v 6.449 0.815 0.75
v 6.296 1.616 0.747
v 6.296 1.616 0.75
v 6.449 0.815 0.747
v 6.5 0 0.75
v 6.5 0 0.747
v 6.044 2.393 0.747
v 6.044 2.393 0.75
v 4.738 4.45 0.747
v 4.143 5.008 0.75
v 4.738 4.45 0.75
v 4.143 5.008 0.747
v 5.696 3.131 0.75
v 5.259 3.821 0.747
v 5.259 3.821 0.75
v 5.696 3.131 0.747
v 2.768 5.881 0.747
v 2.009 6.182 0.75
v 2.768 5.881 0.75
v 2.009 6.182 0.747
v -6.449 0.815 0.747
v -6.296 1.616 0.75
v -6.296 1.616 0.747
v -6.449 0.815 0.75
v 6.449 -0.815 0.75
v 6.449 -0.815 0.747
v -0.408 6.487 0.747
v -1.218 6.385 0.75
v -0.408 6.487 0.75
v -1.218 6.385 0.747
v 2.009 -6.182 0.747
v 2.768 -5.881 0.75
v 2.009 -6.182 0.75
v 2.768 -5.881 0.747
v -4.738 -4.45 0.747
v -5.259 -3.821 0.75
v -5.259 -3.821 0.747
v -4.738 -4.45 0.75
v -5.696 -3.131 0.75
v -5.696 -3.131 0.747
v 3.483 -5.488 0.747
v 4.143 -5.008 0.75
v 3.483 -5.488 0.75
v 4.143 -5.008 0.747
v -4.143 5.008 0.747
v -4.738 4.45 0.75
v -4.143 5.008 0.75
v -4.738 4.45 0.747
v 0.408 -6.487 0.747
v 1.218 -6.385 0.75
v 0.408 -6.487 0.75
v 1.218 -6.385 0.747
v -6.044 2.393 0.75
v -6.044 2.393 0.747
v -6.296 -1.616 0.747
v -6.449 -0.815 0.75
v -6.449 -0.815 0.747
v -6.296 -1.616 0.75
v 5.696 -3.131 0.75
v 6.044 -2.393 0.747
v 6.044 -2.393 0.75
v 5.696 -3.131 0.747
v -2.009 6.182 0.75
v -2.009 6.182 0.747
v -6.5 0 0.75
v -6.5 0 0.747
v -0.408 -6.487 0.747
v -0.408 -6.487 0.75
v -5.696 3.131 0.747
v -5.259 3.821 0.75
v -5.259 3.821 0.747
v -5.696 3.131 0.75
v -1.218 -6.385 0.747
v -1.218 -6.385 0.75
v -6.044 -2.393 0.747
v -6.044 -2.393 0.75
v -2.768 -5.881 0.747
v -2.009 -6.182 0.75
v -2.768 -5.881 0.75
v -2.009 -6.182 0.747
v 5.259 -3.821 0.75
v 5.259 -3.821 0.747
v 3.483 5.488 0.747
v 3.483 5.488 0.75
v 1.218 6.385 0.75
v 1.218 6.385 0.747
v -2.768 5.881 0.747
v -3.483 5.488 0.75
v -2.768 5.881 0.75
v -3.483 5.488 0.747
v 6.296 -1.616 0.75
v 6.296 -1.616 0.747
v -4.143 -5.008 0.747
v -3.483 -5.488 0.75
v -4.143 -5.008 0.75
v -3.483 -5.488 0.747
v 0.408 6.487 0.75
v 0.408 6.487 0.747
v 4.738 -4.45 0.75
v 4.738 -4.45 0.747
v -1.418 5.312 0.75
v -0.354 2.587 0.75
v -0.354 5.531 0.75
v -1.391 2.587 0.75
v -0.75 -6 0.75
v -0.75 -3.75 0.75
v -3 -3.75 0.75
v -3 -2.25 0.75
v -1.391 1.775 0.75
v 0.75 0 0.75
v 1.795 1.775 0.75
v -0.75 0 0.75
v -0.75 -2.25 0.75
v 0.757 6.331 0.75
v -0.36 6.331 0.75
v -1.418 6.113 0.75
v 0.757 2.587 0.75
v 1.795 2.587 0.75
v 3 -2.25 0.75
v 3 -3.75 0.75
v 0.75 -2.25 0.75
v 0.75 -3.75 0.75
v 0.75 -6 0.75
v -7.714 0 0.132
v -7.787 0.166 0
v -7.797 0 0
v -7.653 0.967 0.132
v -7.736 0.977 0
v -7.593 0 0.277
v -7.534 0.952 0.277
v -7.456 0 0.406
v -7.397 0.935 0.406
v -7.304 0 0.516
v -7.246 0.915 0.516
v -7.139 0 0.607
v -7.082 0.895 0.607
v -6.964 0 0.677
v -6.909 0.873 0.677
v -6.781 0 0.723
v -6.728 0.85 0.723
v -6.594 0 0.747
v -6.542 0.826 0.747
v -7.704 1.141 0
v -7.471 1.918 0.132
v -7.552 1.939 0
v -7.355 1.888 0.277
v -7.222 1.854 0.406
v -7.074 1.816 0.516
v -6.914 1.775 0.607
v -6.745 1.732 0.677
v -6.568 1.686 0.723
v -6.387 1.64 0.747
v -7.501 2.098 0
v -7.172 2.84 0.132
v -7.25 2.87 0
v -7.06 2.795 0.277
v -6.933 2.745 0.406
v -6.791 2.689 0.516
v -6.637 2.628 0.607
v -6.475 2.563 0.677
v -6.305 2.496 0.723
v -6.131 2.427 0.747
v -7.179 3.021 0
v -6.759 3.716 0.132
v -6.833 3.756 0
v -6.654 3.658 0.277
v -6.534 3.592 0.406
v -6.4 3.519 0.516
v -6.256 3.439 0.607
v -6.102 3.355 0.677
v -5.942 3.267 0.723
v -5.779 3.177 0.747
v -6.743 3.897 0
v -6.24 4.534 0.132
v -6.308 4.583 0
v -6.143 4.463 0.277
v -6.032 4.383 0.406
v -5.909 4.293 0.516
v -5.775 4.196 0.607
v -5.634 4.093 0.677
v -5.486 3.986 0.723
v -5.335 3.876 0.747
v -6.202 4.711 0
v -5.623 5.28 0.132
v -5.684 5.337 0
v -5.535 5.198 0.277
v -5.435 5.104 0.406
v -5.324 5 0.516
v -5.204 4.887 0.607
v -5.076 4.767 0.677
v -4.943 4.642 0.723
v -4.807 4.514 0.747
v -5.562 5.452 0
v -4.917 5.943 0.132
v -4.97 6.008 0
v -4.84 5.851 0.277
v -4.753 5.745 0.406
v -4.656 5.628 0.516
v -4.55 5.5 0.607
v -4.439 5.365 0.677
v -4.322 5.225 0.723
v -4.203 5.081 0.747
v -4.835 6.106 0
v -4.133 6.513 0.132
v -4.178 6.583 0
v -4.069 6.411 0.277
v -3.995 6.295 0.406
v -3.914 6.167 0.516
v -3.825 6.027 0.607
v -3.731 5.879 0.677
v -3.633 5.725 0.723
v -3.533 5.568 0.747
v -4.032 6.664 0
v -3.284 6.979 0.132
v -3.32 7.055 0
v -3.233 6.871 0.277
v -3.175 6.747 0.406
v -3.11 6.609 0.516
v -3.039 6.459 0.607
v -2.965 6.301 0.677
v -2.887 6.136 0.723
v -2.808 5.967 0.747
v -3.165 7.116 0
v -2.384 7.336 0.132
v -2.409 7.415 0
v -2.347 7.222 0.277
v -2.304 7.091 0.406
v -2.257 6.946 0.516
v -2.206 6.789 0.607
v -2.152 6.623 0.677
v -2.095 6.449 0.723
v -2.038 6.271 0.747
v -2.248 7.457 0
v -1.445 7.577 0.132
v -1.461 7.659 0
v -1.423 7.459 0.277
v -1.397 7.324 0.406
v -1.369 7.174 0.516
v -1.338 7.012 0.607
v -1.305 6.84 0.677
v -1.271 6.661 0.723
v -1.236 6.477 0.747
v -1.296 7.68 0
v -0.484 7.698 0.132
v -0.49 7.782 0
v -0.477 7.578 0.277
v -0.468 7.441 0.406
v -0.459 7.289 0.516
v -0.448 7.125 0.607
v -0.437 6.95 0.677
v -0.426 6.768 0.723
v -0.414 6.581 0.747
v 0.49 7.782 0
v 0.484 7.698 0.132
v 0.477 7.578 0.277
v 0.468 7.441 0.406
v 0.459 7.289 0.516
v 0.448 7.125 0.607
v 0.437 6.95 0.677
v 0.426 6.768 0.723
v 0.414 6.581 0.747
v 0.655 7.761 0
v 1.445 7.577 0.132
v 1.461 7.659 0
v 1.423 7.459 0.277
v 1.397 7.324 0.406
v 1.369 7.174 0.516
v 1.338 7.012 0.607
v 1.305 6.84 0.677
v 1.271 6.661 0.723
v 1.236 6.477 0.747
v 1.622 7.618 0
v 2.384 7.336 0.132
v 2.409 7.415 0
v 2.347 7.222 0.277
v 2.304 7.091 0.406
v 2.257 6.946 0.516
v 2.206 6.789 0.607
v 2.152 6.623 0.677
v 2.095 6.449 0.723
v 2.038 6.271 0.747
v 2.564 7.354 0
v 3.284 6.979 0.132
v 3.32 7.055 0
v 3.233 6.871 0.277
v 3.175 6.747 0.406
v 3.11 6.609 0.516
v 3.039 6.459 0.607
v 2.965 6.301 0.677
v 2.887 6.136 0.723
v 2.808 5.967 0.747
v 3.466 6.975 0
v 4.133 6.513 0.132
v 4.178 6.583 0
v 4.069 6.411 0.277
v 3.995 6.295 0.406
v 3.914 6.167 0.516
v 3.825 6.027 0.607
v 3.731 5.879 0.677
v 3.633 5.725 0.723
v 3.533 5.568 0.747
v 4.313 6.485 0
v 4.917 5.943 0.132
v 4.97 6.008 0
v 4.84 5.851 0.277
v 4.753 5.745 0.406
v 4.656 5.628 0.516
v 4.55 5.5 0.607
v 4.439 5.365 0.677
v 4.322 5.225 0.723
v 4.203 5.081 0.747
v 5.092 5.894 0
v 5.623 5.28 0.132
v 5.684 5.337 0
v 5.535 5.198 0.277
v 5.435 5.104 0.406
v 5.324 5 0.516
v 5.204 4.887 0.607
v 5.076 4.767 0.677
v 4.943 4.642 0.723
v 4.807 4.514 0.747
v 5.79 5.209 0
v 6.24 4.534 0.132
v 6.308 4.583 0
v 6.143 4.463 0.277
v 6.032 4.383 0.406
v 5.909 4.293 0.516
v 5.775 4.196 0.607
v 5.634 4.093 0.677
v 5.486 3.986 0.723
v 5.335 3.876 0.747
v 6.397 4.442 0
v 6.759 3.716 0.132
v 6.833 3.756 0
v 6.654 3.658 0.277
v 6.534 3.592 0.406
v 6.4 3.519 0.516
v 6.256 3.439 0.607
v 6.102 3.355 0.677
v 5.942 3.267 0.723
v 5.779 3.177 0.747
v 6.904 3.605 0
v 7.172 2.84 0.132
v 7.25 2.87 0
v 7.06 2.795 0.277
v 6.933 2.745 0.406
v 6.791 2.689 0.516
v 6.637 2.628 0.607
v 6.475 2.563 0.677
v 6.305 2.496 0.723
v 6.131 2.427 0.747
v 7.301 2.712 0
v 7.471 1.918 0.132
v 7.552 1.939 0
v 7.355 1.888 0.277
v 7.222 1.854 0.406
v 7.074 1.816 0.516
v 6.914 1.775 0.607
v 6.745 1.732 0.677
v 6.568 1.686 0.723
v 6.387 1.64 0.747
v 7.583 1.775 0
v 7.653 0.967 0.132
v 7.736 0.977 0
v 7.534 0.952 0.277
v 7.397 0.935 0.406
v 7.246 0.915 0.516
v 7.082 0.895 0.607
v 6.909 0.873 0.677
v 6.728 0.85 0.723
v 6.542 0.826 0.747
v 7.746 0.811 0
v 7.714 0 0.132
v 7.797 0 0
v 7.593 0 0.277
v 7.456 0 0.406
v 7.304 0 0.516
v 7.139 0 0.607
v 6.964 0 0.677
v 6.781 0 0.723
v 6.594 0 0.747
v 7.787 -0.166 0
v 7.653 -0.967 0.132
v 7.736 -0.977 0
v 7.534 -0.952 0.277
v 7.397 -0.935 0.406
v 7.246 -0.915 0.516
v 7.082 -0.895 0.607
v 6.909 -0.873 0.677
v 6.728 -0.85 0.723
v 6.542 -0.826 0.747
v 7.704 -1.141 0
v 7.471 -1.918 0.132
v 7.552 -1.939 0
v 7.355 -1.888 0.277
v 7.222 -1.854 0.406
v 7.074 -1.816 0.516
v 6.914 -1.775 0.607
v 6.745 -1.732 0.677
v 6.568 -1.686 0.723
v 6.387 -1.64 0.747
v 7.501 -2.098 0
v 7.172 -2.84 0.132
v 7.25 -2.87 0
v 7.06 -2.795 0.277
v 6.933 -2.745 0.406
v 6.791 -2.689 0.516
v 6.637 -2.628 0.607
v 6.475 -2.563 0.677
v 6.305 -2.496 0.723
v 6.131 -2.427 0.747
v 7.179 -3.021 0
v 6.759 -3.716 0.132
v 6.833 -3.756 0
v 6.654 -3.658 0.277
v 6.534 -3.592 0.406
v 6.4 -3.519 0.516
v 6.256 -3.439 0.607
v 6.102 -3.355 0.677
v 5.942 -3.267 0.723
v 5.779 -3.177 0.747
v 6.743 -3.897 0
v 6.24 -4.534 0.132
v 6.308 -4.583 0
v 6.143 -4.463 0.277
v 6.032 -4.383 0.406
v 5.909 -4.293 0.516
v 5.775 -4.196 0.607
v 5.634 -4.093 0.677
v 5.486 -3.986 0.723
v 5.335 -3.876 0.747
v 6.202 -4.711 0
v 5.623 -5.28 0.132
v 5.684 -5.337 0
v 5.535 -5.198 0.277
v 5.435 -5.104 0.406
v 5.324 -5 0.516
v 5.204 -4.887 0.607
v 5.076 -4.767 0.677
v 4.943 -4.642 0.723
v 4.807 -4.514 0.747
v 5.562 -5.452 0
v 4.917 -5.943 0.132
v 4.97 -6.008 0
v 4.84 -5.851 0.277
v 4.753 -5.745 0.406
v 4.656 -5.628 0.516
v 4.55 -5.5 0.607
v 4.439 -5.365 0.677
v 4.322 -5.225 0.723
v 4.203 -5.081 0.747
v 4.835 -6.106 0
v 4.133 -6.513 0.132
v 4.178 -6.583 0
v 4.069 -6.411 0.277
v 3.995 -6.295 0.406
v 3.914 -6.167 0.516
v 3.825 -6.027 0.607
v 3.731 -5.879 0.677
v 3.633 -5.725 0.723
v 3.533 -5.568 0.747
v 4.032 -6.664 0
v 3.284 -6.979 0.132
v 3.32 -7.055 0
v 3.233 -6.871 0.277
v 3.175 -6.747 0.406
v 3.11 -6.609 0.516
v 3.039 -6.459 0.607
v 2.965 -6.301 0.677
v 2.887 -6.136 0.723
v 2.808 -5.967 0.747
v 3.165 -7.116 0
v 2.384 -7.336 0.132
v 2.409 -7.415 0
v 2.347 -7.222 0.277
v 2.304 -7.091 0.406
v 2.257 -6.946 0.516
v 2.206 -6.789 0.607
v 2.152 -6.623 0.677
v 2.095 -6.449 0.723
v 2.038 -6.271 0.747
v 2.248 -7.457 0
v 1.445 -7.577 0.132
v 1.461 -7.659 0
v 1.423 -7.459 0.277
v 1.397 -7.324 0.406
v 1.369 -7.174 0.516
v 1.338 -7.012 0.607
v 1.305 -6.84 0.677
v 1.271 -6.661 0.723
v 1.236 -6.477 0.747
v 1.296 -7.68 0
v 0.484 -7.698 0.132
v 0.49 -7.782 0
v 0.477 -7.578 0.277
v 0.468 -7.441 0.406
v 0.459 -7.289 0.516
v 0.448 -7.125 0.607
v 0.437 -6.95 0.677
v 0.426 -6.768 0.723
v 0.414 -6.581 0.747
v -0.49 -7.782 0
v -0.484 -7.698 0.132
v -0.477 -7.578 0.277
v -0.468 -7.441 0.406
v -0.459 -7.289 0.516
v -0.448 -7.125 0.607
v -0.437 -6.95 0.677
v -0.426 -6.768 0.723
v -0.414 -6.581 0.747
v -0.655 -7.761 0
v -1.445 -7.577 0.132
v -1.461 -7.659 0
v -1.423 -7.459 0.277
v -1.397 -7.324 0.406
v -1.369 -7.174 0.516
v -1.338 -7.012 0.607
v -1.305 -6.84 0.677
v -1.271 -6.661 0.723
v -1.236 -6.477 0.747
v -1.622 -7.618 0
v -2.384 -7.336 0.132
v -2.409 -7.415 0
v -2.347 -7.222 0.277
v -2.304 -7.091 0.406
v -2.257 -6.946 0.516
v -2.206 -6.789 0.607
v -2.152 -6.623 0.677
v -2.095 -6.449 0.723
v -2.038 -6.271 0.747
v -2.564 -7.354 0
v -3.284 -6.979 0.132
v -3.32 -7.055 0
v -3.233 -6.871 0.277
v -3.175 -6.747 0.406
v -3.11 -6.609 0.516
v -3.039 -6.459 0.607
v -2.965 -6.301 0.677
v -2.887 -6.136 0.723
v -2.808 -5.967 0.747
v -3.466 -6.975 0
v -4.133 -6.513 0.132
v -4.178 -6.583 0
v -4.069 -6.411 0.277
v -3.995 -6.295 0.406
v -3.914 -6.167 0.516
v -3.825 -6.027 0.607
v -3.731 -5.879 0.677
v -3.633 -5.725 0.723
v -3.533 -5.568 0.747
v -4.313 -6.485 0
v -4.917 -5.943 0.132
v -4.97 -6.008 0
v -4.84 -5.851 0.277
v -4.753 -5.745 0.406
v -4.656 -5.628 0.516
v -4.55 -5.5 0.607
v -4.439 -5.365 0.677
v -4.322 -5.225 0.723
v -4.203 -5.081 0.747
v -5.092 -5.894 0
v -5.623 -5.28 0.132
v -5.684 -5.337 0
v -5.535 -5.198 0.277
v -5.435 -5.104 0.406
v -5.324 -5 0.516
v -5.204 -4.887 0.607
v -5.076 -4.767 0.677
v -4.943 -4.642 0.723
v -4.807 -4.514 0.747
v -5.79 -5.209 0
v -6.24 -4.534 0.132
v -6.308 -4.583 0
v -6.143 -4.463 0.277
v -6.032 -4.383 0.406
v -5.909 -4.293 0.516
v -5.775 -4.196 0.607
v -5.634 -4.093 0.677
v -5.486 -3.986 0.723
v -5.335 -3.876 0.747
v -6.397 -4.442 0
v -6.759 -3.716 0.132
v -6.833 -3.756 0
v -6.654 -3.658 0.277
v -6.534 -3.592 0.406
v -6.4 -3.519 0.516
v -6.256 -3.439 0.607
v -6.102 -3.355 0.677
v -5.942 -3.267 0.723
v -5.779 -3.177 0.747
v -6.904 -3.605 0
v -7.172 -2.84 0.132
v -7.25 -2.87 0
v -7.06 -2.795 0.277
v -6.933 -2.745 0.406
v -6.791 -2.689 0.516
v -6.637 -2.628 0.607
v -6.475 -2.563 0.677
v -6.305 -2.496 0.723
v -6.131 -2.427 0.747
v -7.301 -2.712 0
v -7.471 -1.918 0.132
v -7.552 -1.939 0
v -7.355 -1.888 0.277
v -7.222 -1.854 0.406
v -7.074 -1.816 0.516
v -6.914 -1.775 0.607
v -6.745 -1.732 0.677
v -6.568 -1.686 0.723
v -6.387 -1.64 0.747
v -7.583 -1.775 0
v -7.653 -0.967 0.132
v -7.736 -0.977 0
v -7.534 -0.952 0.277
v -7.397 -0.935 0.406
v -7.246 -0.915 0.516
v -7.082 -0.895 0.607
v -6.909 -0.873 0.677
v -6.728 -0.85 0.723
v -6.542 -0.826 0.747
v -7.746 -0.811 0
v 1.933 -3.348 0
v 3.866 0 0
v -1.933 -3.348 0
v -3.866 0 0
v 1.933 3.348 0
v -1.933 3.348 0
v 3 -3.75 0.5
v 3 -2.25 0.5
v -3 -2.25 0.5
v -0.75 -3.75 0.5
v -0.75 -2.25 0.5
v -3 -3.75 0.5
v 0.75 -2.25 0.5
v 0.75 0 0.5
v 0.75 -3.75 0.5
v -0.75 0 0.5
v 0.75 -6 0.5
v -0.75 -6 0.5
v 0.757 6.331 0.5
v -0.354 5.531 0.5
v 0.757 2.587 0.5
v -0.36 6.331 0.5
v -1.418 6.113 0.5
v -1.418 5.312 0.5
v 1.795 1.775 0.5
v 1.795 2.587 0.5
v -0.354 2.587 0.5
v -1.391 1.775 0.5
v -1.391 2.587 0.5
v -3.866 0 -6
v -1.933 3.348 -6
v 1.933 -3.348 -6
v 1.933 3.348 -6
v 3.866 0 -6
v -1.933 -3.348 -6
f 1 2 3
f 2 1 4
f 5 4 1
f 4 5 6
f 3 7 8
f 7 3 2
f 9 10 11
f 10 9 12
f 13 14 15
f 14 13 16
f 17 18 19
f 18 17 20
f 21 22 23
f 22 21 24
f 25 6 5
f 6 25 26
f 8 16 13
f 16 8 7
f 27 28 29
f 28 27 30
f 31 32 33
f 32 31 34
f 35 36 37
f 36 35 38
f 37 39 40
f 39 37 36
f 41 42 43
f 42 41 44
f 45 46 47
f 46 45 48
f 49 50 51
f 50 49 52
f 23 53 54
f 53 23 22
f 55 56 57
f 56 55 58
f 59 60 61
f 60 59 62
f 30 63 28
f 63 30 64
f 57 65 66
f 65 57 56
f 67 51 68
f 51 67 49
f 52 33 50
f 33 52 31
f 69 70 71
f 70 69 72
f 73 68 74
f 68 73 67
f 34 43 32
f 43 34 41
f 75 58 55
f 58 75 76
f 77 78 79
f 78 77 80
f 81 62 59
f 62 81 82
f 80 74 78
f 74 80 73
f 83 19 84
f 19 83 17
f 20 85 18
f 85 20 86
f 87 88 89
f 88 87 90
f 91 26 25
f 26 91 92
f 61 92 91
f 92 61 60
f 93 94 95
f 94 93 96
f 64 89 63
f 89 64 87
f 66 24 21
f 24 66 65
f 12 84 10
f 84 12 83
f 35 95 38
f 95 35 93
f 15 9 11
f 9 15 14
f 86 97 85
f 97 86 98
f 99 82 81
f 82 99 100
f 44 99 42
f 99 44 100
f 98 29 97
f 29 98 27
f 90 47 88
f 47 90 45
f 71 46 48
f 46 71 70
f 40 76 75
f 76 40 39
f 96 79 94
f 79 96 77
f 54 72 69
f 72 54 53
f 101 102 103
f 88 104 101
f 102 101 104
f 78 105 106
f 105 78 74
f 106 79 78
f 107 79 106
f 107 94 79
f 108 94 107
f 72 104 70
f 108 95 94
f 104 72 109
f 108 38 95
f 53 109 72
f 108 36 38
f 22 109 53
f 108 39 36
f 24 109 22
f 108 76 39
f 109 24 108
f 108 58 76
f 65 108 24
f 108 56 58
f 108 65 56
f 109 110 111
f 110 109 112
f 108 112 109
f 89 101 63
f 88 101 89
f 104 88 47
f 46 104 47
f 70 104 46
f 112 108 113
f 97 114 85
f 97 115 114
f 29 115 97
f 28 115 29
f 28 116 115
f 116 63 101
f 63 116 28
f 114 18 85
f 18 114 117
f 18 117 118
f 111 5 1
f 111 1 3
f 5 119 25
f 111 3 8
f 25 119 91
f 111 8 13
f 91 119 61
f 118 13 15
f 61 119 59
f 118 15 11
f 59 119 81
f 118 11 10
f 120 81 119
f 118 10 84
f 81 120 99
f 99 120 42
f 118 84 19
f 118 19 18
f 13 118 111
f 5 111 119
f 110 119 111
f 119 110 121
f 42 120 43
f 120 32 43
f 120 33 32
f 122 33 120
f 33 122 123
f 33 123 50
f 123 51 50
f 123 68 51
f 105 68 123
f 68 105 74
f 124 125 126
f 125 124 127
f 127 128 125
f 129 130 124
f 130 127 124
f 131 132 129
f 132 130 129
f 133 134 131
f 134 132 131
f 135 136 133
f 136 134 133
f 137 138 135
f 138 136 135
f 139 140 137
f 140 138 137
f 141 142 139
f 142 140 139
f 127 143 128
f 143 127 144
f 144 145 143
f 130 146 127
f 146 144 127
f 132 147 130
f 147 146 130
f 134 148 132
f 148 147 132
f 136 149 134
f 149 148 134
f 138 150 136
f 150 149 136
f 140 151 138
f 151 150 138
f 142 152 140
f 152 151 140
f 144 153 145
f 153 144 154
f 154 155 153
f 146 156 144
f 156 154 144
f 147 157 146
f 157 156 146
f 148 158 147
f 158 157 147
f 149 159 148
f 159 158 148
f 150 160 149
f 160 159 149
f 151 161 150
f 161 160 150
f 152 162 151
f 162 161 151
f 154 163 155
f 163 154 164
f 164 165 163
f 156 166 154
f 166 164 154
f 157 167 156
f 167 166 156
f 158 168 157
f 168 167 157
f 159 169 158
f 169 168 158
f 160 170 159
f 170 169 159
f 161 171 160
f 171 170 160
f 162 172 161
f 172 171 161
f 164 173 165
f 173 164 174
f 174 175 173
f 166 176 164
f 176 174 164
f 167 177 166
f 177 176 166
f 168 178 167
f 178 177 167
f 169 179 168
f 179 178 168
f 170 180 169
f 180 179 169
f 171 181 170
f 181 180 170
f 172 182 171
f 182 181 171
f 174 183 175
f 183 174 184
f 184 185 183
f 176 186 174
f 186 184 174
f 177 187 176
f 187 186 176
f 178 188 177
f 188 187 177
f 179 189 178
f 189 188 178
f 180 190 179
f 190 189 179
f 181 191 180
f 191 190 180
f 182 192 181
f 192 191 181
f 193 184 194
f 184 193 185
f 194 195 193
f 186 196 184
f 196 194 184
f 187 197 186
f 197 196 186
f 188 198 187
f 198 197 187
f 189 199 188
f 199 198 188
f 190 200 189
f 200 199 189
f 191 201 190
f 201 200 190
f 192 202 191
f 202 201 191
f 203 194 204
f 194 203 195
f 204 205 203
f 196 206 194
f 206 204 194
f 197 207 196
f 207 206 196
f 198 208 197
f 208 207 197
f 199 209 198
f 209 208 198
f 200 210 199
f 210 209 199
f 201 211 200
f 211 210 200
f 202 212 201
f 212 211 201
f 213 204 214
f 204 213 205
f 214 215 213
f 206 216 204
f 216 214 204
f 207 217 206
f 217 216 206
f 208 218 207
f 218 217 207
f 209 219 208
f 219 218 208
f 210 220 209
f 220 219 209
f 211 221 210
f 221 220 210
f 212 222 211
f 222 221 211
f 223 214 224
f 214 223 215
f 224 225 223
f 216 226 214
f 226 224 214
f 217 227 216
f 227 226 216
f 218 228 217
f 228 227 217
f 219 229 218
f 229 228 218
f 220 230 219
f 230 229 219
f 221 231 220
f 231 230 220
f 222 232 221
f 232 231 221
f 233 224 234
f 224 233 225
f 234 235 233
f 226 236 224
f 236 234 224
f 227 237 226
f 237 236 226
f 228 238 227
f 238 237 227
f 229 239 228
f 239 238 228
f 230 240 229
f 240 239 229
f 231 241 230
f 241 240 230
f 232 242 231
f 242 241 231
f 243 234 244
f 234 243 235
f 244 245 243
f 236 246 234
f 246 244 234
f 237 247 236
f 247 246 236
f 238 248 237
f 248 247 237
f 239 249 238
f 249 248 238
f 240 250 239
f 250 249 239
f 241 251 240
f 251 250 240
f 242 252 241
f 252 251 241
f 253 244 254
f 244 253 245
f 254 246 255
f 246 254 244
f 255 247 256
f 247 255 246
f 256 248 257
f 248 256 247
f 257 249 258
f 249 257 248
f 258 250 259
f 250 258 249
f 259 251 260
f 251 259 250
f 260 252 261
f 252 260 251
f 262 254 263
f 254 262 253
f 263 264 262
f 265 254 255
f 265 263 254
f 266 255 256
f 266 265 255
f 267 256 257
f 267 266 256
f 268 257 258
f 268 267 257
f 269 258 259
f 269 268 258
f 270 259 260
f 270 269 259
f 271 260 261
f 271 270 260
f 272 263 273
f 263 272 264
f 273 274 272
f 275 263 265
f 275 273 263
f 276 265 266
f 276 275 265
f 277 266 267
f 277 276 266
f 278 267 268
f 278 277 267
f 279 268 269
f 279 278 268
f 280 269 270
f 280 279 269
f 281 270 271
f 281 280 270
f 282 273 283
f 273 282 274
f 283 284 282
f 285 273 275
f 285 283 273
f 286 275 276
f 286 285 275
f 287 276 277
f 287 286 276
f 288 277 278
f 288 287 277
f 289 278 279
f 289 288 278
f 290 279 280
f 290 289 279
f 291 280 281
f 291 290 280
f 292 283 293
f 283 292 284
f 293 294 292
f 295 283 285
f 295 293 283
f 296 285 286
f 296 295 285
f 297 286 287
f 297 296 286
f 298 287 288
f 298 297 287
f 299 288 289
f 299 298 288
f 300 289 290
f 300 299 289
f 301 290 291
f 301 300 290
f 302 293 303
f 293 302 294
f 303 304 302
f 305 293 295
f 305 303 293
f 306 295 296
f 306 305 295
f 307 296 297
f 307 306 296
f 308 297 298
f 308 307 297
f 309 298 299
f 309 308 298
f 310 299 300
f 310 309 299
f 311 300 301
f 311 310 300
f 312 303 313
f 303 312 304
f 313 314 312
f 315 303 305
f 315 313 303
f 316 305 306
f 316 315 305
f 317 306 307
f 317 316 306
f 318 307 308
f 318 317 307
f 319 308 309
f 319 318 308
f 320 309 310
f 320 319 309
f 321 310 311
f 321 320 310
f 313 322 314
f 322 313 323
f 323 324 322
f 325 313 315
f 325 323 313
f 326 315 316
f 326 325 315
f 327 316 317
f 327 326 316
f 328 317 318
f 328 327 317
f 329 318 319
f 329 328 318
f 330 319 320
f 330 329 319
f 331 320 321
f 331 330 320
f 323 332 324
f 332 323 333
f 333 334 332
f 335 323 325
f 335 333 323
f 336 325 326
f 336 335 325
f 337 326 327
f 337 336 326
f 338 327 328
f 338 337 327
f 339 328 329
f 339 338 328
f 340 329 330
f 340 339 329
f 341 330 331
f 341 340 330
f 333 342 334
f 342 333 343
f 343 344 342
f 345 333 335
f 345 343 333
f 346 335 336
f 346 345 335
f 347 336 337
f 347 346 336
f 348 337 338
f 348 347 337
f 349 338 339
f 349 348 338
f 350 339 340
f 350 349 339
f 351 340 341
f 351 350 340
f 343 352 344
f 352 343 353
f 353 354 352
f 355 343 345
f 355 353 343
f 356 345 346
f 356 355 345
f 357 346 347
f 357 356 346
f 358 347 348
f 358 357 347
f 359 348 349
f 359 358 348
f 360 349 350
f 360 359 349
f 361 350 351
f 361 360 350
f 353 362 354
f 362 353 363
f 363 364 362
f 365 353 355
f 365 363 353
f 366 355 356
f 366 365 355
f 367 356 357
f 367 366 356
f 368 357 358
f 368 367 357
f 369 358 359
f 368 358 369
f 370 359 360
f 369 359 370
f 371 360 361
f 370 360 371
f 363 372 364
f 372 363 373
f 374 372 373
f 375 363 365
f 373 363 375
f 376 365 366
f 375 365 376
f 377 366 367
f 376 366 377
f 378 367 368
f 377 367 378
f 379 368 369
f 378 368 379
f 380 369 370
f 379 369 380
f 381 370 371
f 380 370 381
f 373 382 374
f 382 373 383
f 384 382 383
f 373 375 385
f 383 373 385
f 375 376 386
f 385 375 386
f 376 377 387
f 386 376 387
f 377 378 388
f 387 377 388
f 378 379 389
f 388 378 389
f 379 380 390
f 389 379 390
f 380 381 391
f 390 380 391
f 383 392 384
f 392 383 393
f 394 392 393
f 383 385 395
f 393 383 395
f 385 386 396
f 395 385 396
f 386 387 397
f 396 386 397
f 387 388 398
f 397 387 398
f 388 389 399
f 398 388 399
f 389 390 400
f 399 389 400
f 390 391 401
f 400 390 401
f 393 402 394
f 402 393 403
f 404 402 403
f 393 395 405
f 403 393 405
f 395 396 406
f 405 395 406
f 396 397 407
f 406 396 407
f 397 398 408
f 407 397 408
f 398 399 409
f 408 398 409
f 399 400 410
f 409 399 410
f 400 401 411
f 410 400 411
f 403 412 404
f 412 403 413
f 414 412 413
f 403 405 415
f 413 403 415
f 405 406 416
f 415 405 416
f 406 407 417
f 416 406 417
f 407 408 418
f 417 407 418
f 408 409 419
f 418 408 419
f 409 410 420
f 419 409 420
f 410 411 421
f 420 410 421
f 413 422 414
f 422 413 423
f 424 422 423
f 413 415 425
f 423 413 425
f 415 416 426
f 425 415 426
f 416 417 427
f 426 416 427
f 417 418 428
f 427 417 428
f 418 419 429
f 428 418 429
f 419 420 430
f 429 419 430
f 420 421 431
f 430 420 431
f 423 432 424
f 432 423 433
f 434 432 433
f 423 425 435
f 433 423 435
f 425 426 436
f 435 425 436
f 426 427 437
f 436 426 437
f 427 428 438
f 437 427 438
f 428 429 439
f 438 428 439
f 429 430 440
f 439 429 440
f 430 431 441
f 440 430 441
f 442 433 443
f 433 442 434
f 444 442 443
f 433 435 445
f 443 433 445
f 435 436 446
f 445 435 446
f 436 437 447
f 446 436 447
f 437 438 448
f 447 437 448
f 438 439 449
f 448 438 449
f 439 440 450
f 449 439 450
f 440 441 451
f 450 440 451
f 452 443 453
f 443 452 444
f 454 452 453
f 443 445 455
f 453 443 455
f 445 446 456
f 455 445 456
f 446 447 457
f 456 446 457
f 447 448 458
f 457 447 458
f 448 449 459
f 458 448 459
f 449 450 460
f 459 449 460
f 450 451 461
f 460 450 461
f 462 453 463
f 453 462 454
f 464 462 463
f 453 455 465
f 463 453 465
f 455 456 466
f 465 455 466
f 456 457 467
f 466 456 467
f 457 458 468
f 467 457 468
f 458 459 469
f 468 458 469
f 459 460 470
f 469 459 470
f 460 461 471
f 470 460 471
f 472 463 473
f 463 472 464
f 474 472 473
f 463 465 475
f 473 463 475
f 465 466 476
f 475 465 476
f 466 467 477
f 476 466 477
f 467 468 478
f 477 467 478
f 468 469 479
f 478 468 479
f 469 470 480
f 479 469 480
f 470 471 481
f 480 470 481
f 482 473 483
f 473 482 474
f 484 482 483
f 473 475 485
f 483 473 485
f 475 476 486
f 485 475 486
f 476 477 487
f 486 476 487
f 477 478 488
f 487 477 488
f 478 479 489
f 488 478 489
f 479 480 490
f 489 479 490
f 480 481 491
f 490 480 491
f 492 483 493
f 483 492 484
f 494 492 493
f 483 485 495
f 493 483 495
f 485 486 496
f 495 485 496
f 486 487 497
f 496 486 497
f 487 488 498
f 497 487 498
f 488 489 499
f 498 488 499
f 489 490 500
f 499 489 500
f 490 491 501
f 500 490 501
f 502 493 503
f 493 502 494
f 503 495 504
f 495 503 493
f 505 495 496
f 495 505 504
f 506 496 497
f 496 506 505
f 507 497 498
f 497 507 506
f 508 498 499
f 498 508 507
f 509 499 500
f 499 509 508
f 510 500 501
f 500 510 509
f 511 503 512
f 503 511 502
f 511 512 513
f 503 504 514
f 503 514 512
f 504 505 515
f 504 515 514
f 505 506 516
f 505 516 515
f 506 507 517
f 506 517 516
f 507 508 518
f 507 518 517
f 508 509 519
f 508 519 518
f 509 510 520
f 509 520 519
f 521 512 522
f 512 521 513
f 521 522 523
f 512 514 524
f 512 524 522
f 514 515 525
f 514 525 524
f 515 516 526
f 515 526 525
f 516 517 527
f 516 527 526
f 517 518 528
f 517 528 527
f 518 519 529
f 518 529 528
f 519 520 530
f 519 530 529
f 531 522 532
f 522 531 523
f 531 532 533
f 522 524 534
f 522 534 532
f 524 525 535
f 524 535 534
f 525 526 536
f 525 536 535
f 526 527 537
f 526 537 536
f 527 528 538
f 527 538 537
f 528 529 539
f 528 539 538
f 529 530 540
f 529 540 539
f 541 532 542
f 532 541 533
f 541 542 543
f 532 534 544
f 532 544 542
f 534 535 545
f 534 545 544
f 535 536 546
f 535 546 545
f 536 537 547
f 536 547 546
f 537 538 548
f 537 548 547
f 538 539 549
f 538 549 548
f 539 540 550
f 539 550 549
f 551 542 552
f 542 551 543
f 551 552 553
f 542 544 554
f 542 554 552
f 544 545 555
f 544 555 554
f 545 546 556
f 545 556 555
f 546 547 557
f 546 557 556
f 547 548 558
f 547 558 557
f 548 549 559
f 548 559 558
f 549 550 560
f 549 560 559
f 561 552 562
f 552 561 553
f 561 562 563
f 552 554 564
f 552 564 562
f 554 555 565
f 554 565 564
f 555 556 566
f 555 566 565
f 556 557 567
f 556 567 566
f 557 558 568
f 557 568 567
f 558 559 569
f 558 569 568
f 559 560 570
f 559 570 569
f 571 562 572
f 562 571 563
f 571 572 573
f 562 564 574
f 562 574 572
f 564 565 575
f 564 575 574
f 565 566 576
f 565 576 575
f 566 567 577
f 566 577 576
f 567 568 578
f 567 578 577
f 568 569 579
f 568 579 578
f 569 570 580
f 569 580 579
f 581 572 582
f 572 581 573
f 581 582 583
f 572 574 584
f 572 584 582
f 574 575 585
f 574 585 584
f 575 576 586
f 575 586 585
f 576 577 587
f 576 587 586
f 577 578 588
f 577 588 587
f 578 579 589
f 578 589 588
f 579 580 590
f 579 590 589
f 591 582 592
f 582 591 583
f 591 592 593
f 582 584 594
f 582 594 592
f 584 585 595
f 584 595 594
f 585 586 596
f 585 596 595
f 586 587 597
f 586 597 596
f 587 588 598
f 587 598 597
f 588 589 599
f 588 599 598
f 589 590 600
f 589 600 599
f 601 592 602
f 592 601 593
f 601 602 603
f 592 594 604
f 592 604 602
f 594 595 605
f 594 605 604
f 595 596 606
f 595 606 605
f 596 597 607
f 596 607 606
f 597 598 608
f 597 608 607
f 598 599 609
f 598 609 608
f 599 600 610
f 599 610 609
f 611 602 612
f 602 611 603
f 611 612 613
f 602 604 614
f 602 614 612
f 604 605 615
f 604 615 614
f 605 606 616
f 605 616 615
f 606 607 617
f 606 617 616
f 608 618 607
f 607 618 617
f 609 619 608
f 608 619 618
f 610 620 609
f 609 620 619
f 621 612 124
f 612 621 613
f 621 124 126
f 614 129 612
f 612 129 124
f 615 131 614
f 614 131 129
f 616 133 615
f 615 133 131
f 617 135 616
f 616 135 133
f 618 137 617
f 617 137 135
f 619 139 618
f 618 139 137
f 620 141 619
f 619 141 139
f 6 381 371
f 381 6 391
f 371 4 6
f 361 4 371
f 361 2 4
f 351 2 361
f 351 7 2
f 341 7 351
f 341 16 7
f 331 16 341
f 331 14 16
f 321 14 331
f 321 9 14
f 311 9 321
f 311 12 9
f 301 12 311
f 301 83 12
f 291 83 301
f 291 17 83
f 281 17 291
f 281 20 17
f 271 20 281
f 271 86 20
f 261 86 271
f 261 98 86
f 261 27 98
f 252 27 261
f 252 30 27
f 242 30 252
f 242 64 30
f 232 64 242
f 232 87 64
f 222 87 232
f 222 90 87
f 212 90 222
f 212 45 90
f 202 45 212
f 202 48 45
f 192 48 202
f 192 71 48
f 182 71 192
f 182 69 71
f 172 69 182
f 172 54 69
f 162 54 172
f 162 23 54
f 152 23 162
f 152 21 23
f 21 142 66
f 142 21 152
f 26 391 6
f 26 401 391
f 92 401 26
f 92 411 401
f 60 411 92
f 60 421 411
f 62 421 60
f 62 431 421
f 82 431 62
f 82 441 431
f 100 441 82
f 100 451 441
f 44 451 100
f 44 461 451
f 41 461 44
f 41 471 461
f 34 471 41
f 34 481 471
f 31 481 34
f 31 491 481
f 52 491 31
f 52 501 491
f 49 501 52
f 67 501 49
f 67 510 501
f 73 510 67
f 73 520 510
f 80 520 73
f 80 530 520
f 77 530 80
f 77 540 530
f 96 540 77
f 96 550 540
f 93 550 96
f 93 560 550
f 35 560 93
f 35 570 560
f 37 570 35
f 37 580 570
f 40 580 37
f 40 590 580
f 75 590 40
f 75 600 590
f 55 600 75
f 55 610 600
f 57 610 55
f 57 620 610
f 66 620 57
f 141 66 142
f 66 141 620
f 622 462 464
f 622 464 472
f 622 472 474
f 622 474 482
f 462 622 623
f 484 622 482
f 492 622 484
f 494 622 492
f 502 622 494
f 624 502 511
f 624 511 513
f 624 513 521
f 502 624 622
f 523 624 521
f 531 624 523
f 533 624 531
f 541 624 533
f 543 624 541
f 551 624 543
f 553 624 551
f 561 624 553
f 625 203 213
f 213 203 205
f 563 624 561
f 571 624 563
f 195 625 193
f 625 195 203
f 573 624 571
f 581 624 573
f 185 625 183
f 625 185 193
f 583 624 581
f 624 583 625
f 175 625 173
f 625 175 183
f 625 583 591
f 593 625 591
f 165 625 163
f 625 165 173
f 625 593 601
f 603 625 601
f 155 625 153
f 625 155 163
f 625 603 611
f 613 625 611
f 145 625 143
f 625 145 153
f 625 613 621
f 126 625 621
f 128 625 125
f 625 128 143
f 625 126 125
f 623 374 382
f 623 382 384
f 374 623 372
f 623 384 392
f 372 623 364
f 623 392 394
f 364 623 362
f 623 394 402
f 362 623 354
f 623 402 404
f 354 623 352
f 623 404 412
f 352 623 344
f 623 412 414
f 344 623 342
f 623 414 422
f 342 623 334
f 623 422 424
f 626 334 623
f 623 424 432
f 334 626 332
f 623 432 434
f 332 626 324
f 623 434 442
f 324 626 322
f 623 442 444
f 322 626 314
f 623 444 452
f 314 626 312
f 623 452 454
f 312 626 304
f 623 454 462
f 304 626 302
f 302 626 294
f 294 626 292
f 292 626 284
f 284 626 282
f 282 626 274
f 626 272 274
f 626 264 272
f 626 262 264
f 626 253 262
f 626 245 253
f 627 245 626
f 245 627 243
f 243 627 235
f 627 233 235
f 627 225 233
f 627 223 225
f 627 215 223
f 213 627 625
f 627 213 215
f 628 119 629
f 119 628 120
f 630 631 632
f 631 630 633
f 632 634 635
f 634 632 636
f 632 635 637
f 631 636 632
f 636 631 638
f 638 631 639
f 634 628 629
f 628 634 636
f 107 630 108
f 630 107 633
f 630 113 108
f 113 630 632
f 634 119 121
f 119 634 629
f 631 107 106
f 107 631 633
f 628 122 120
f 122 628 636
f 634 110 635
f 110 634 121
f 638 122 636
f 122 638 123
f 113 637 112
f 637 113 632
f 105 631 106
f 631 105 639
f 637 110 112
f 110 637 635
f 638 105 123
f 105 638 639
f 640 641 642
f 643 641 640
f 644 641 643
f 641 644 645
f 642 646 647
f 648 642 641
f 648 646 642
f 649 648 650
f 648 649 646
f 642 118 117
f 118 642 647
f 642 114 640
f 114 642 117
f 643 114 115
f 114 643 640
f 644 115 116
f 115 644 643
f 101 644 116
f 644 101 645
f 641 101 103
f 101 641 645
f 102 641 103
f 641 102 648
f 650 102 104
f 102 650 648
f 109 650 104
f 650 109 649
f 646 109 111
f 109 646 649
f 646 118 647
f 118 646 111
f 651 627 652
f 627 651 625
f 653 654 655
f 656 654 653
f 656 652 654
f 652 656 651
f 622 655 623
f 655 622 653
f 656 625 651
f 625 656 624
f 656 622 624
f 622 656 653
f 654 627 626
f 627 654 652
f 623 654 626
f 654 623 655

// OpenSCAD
$fn = 50;


union() {
	difference() {
		union() {
			translate(v = [0, 0, -0.7500000000]) {
				cylinder(h = 1.5000000000, r = 6.5000000000);
			}
			translate(v = [0, 0, -0.7500000000]) {
				rotate_extrude(angle = 360) {
					translate(v = [6.5000000000, 0, 0]) {
						circle(r = 1.5000000000);
					}
				}
			}
		}
		union() {
			translate(v = [-25.0000000000, -25.0000000000, -50]) {
				cube(size = [50, 50, 50]);
			}
			#translate(v = [-3.0000000000, -3.7500000000, 0.5000000000]) {
				cube(size = [6, 1.5000000000, 0.2500000000]);
			}
			#translate(v = [-0.7500000000, -6.0000000000, 0.5000000000]) {
				cube(size = [1.5000000000, 6, 0.2500000000]);
			}
			#translate(v = [0, 4, 0.5000000000]) {
				linear_extrude(height = 0.2500000000) {
					text(font = "SegoiUI:Bold", halign = "center", size = 4.5000000000, text = "1", valign = "center");
				}
			}
		}
	}
	union() {
		translate(v = [0, 0, -6]) {
			linear_extrude(height = 6) {
				polygon(points = [[3.8658550000, 0.0000000000], [1.9329275000, 3.3479286373], [-1.9329275000, 3.3479286373], [-3.8658550000, 0.0000000000], [-1.9329275000, -3.3479286373], [1.9329275000, -3.3479286373]]);
			}
		}
	}
}
